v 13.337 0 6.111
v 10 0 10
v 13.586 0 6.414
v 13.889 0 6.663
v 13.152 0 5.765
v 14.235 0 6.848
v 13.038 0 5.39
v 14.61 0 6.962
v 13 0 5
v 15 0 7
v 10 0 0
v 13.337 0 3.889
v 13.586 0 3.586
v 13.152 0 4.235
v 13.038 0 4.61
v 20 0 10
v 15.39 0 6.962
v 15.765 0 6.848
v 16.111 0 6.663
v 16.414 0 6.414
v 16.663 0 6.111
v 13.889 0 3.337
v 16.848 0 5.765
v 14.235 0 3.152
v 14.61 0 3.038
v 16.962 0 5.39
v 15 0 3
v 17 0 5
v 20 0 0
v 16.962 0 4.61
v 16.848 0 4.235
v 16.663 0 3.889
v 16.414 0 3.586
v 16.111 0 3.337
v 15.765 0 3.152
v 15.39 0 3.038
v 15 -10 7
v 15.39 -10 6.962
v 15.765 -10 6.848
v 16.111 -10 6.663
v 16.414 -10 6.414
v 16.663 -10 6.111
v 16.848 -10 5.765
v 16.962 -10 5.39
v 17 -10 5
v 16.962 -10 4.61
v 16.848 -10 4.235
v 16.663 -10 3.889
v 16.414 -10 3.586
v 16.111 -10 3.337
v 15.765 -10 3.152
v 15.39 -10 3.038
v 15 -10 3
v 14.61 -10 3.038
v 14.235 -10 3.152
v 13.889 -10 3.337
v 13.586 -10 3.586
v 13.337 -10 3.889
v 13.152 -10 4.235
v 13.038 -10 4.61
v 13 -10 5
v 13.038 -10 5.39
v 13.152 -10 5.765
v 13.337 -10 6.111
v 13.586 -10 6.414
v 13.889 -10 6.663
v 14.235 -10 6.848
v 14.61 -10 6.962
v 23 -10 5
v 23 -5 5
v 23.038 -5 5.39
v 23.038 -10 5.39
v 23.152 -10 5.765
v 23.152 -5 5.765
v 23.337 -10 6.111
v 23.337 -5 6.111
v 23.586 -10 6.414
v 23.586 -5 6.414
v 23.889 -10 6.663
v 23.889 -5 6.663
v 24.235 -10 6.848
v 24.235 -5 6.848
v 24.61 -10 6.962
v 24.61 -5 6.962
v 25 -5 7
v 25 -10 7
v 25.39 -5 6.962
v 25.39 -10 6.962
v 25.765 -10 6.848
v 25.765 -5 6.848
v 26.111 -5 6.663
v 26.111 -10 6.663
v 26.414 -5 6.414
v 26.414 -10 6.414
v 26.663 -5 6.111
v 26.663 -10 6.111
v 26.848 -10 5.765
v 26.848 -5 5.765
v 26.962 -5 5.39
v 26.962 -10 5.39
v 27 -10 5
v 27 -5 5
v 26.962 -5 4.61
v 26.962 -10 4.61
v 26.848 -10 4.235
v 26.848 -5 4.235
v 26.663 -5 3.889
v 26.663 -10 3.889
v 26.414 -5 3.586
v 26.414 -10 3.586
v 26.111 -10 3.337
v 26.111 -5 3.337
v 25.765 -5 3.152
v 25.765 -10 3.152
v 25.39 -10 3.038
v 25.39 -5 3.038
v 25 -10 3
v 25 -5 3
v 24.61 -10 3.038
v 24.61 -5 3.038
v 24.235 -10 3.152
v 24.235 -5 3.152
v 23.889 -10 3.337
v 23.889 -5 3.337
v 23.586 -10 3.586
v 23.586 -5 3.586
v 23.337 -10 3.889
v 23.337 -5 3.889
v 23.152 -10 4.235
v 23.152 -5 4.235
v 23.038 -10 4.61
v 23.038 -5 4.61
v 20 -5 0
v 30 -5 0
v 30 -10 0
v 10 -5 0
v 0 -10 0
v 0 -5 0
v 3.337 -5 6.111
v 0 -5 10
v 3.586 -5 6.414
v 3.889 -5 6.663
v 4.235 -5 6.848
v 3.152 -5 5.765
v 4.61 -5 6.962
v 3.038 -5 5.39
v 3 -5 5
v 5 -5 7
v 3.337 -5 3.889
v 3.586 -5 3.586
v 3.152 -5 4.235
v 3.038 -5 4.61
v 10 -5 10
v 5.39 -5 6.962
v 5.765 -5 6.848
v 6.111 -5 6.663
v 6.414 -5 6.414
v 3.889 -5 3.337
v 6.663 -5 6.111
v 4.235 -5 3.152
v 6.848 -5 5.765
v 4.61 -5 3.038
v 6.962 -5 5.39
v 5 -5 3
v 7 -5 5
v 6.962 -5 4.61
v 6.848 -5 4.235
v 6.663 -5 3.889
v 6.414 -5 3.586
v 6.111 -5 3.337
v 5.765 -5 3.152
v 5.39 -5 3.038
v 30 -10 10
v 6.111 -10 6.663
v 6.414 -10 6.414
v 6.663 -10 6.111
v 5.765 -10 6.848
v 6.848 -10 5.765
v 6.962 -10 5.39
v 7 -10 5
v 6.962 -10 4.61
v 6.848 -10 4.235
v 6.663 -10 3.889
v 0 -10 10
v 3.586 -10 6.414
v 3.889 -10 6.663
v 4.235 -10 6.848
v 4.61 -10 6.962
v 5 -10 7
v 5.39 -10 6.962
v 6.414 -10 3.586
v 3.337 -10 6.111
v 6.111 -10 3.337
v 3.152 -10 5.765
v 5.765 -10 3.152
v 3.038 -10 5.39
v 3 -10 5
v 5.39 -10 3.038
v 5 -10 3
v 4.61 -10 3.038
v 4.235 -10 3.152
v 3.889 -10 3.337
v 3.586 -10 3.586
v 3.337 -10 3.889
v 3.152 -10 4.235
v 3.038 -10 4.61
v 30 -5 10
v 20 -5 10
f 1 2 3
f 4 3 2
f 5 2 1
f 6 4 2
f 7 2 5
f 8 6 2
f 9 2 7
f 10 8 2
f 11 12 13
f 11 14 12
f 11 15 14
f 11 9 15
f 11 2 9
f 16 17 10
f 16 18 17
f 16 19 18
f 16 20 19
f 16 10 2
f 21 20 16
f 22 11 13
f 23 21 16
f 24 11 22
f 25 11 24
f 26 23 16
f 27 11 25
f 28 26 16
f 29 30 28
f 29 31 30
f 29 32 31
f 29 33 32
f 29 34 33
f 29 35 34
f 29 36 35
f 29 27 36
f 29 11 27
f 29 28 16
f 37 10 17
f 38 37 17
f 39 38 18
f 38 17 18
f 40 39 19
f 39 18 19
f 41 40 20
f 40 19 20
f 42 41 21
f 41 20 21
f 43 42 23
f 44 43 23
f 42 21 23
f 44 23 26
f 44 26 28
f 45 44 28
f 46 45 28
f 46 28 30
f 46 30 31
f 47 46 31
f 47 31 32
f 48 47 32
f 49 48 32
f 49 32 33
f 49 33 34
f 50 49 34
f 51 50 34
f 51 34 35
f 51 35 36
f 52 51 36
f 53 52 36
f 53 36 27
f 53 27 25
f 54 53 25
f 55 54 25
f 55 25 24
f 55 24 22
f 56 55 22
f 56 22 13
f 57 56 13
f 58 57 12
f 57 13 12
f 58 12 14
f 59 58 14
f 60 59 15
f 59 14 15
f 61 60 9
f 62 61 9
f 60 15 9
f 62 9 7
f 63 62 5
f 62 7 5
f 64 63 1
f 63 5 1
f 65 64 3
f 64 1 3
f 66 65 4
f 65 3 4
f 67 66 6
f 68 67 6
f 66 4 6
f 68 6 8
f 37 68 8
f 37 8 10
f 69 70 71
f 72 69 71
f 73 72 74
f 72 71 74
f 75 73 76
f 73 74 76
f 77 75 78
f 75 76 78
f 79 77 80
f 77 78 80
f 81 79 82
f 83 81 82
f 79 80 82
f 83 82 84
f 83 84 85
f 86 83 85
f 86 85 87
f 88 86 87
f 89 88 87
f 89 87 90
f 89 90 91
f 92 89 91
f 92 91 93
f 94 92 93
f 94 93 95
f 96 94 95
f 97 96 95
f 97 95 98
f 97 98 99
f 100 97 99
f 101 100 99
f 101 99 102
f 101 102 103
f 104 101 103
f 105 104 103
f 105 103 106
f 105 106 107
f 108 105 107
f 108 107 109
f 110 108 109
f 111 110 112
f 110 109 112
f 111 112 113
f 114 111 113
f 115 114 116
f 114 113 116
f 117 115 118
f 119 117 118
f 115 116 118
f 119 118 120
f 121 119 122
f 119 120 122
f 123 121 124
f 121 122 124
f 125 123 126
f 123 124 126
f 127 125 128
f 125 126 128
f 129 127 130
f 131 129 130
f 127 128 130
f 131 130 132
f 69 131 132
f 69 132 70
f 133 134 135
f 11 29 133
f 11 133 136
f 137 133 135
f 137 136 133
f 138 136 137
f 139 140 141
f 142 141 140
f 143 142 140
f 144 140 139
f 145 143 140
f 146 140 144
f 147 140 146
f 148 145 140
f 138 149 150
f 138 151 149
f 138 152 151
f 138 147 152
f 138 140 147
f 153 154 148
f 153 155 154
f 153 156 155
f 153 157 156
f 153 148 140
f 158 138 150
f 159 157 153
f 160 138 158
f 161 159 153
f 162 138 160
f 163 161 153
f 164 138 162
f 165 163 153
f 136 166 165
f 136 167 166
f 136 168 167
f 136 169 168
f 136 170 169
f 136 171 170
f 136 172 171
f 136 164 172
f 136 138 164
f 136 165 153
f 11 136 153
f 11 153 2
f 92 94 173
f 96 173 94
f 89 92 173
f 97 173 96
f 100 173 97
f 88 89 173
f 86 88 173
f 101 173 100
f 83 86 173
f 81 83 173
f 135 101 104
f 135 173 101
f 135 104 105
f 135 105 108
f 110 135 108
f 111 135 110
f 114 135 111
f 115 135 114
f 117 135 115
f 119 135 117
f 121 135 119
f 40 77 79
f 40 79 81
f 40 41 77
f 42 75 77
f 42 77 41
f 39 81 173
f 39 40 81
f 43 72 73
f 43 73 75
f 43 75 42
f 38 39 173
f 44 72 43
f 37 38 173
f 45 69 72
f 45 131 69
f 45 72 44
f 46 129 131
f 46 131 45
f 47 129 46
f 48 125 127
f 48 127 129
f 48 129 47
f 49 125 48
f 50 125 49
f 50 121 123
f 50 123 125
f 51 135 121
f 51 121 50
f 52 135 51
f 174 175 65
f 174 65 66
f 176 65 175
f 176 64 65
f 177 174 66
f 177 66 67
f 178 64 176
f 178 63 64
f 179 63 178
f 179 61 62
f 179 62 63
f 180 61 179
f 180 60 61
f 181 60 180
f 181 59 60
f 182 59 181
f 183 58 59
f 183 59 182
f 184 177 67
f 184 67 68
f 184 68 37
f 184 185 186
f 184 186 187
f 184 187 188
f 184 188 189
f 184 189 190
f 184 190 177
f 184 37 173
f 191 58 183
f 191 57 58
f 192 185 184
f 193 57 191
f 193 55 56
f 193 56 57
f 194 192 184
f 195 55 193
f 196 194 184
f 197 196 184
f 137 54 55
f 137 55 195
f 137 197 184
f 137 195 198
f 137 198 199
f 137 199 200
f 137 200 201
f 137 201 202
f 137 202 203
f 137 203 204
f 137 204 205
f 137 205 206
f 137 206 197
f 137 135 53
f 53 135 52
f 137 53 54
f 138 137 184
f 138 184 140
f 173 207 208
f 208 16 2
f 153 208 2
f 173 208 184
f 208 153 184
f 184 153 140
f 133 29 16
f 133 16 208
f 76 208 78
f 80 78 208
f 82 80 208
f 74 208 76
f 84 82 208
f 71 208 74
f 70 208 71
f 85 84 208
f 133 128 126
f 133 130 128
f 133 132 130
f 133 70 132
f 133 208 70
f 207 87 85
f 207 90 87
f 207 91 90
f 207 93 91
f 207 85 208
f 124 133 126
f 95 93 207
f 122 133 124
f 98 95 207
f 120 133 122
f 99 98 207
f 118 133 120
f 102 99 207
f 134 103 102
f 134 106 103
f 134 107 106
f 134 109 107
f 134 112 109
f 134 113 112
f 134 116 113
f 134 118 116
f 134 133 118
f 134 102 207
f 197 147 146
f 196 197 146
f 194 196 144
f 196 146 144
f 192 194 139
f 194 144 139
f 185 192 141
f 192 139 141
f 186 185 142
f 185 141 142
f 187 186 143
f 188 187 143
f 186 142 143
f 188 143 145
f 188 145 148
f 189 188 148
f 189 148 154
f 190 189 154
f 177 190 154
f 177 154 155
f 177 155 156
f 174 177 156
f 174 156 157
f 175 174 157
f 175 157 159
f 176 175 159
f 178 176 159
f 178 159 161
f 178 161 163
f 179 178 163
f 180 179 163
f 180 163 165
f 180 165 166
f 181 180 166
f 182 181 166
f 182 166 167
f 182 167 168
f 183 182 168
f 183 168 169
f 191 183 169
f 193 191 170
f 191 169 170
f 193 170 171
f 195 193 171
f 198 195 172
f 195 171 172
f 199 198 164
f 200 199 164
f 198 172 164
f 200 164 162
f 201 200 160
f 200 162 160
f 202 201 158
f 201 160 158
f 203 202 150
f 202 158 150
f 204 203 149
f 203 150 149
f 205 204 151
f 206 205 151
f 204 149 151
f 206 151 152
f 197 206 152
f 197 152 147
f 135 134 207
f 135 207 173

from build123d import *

# Parameters (mm, degrees)
BOSS_EXTRUDE1_DEPTH = 10
SKETCH2_R           = 2
CUT_EXTRUDE1_DEPTH  = 34.166247904
SKETCH3_R           = 2
CUT_EXTRUDE2_DEPTH  = 33.015621187


with BuildPart() as part:
    # Sketch1 → Boss-Extrude1 (new body)
    with BuildSketch(Plane.XY):
        Polygon((10, 0), (20, 0), (20, -5), (30, -5), (30, -10), (0, -10), (0, -5), (10, -5), align=None)
    extrude(amount=BOSS_EXTRUDE1_DEPTH)

    # Sketch2 → Cut-Extrude1 (cut, through all)
    with BuildSketch(Plane(origin=(0, 0, 0), x_dir=(1, 0, 0), z_dir=(0, 1, 0))):
        with Locations(Location((15, -5, 0), (0, 0, 270))):
            Circle(SKETCH2_R)
    extrude(amount=-CUT_EXTRUDE1_DEPTH, mode=Mode.SUBTRACT)

    # Sketch3 → Cut-Extrude2 (cut, through all)
    with BuildSketch(Plane(origin=(0, -5, 0), x_dir=(1, 0, 0), z_dir=(0, 1, 0))):
        with Locations(Location((5, -5, 0), (0, 0, 180))):
            Circle(SKETCH3_R)
        with Locations(Location((25, -5, 0), (0, 0, 180))):
            Circle(SKETCH3_R)
    extrude(amount=-CUT_EXTRUDE2_DEPTH, mode=Mode.SUBTRACT)


solid = part.part
